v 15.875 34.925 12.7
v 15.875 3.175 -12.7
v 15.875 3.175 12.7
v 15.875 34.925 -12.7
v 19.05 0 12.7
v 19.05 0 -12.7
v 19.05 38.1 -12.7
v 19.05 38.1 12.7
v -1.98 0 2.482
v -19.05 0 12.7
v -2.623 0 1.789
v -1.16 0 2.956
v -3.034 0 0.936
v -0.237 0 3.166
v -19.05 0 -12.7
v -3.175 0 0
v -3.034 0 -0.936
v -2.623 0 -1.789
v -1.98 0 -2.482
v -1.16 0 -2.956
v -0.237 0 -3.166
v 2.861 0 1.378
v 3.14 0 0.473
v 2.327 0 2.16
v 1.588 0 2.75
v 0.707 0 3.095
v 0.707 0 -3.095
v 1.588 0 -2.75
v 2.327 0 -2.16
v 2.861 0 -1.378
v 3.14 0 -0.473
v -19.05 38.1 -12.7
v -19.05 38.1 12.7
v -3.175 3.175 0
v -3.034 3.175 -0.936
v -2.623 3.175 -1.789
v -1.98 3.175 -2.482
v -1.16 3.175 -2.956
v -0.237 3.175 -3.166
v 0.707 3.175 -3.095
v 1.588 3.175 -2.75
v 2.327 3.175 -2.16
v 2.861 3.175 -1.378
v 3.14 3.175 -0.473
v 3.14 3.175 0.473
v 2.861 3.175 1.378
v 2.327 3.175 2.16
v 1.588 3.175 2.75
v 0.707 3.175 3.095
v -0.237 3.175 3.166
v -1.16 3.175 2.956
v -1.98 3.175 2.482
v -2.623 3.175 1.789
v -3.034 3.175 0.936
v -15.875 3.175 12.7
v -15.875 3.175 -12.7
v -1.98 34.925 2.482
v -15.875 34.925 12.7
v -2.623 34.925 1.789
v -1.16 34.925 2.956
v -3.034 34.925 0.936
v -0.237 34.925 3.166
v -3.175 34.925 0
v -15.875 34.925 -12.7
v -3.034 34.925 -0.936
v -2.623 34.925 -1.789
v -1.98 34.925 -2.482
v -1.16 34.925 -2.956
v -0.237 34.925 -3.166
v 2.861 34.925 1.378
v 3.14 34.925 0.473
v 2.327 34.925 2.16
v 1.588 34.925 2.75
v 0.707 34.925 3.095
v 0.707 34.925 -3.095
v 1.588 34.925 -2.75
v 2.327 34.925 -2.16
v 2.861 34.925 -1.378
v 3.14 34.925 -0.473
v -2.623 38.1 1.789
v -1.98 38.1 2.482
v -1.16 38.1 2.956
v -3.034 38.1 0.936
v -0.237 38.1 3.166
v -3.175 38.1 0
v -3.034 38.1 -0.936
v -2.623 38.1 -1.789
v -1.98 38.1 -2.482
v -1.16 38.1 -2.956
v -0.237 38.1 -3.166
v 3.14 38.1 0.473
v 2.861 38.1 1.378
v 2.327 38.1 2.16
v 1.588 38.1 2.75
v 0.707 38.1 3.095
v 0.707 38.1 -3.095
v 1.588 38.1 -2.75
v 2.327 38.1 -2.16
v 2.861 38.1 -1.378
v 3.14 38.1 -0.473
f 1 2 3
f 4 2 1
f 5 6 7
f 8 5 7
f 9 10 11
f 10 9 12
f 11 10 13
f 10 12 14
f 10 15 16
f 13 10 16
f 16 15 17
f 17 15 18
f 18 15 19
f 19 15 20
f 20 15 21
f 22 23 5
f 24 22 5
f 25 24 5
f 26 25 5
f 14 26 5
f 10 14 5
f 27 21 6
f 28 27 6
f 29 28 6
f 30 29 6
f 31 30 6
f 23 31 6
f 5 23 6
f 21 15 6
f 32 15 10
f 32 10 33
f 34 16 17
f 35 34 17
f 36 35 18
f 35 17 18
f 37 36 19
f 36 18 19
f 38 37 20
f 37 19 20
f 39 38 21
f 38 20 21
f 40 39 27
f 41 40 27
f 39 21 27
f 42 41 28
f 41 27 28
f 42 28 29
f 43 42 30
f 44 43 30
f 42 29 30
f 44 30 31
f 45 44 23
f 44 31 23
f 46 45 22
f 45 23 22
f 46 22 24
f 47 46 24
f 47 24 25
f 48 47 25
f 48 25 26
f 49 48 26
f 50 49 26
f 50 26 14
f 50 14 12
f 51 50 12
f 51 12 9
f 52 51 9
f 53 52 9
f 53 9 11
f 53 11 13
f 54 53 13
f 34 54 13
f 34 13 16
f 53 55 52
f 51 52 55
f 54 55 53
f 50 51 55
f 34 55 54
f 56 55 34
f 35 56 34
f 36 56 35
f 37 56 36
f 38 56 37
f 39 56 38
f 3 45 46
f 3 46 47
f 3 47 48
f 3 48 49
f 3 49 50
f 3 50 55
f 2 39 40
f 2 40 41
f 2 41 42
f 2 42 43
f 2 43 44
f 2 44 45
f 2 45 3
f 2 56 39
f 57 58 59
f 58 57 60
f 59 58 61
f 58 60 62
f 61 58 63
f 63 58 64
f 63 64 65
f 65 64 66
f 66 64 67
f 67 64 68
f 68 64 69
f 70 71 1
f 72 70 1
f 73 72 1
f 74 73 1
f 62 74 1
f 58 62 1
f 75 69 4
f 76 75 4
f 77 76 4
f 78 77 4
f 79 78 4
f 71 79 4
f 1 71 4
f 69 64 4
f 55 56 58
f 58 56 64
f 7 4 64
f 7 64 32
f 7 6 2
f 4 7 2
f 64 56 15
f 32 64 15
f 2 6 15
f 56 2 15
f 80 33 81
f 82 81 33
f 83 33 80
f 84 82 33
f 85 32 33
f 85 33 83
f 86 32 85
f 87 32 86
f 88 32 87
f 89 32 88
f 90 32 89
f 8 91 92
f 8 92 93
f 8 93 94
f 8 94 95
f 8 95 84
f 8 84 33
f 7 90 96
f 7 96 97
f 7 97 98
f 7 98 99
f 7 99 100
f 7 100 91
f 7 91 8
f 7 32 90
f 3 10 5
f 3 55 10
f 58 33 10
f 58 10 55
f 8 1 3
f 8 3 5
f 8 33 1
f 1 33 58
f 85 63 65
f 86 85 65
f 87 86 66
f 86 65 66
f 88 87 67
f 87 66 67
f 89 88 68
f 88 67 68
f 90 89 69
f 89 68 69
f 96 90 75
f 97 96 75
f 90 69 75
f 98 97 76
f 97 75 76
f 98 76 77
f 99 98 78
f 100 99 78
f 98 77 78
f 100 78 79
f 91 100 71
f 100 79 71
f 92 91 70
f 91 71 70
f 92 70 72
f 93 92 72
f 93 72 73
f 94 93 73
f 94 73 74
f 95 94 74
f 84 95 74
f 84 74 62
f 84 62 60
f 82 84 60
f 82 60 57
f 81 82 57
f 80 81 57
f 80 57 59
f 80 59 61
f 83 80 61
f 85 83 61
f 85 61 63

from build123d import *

# Parameters (mm, degrees)
SKETCH1_W        = 38.1
SKETCH1_H        = 25.4
EXTRUSION1_DEPTH = 38.1
SHELL1_T         = -3.175
HOLE1_D          = 6.35
SKETCH4_W        = 38.1
SKETCH4_H        = 38.1
SKETCH4_W_2      = 31.75
SKETCH4_H_2      = 31.75
EXTRUSION2_DEPTH = 5.3848
SKETCH5_W        = 38.1
SKETCH5_H        = 5.3848
EXTRUSION3_DEPTH = 38.1


with BuildPart() as part:
    # Sketch1 → Extrusion1 (new body)
    with BuildSketch(Plane(origin=(0, 0, 0), x_dir=(-1, 0, 0), z_dir=(0, 1, 0))):
        Rectangle(SKETCH1_W, SKETCH1_H)
    extrude(amount=EXTRUSION1_DEPTH)

    # Shell1
    shell1_openings = [part.faces().sort_by_distance(p)[0] for p in [
        (0, 19.05, 12.7),
        (0, 19.05, -12.7),
    ]]
    offset(amount=SHELL1_T, openings=shell1_openings, kind=Kind.INTERSECTION)

    # Hole1 (through all)
    with Locations(Plane(origin=(0, 38.1, 0), x_dir=(1, 0, 0), z_dir=(0, 1, 0))):
        with Locations((0, 0)):
            Hole(HOLE1_D / 2)

    # Sketch4 → Extrusion2 (add)
    with BuildSketch(Plane.XY.offset(12.7)):
        with Locations((0, 19.05)):
            Rectangle(SKETCH4_W, SKETCH4_H)
        with Locations((0, 19.05)):
            Rectangle(SKETCH4_W_2, SKETCH4_H_2, mode=Mode.SUBTRACT)
    extrude(amount=EXTRUSION2_DEPTH)

    # Sketch5 → Extrusion3 (cut)
    with BuildSketch(Plane(origin=(0, 38.1, 0), x_dir=(1, 0, 0), z_dir=(0, 1, 0))):
        with Locations((0, -15.3924)):
            Rectangle(SKETCH5_W, SKETCH5_H)
    extrude(amount=-EXTRUSION3_DEPTH, mode=Mode.SUBTRACT)


solid = part.part
